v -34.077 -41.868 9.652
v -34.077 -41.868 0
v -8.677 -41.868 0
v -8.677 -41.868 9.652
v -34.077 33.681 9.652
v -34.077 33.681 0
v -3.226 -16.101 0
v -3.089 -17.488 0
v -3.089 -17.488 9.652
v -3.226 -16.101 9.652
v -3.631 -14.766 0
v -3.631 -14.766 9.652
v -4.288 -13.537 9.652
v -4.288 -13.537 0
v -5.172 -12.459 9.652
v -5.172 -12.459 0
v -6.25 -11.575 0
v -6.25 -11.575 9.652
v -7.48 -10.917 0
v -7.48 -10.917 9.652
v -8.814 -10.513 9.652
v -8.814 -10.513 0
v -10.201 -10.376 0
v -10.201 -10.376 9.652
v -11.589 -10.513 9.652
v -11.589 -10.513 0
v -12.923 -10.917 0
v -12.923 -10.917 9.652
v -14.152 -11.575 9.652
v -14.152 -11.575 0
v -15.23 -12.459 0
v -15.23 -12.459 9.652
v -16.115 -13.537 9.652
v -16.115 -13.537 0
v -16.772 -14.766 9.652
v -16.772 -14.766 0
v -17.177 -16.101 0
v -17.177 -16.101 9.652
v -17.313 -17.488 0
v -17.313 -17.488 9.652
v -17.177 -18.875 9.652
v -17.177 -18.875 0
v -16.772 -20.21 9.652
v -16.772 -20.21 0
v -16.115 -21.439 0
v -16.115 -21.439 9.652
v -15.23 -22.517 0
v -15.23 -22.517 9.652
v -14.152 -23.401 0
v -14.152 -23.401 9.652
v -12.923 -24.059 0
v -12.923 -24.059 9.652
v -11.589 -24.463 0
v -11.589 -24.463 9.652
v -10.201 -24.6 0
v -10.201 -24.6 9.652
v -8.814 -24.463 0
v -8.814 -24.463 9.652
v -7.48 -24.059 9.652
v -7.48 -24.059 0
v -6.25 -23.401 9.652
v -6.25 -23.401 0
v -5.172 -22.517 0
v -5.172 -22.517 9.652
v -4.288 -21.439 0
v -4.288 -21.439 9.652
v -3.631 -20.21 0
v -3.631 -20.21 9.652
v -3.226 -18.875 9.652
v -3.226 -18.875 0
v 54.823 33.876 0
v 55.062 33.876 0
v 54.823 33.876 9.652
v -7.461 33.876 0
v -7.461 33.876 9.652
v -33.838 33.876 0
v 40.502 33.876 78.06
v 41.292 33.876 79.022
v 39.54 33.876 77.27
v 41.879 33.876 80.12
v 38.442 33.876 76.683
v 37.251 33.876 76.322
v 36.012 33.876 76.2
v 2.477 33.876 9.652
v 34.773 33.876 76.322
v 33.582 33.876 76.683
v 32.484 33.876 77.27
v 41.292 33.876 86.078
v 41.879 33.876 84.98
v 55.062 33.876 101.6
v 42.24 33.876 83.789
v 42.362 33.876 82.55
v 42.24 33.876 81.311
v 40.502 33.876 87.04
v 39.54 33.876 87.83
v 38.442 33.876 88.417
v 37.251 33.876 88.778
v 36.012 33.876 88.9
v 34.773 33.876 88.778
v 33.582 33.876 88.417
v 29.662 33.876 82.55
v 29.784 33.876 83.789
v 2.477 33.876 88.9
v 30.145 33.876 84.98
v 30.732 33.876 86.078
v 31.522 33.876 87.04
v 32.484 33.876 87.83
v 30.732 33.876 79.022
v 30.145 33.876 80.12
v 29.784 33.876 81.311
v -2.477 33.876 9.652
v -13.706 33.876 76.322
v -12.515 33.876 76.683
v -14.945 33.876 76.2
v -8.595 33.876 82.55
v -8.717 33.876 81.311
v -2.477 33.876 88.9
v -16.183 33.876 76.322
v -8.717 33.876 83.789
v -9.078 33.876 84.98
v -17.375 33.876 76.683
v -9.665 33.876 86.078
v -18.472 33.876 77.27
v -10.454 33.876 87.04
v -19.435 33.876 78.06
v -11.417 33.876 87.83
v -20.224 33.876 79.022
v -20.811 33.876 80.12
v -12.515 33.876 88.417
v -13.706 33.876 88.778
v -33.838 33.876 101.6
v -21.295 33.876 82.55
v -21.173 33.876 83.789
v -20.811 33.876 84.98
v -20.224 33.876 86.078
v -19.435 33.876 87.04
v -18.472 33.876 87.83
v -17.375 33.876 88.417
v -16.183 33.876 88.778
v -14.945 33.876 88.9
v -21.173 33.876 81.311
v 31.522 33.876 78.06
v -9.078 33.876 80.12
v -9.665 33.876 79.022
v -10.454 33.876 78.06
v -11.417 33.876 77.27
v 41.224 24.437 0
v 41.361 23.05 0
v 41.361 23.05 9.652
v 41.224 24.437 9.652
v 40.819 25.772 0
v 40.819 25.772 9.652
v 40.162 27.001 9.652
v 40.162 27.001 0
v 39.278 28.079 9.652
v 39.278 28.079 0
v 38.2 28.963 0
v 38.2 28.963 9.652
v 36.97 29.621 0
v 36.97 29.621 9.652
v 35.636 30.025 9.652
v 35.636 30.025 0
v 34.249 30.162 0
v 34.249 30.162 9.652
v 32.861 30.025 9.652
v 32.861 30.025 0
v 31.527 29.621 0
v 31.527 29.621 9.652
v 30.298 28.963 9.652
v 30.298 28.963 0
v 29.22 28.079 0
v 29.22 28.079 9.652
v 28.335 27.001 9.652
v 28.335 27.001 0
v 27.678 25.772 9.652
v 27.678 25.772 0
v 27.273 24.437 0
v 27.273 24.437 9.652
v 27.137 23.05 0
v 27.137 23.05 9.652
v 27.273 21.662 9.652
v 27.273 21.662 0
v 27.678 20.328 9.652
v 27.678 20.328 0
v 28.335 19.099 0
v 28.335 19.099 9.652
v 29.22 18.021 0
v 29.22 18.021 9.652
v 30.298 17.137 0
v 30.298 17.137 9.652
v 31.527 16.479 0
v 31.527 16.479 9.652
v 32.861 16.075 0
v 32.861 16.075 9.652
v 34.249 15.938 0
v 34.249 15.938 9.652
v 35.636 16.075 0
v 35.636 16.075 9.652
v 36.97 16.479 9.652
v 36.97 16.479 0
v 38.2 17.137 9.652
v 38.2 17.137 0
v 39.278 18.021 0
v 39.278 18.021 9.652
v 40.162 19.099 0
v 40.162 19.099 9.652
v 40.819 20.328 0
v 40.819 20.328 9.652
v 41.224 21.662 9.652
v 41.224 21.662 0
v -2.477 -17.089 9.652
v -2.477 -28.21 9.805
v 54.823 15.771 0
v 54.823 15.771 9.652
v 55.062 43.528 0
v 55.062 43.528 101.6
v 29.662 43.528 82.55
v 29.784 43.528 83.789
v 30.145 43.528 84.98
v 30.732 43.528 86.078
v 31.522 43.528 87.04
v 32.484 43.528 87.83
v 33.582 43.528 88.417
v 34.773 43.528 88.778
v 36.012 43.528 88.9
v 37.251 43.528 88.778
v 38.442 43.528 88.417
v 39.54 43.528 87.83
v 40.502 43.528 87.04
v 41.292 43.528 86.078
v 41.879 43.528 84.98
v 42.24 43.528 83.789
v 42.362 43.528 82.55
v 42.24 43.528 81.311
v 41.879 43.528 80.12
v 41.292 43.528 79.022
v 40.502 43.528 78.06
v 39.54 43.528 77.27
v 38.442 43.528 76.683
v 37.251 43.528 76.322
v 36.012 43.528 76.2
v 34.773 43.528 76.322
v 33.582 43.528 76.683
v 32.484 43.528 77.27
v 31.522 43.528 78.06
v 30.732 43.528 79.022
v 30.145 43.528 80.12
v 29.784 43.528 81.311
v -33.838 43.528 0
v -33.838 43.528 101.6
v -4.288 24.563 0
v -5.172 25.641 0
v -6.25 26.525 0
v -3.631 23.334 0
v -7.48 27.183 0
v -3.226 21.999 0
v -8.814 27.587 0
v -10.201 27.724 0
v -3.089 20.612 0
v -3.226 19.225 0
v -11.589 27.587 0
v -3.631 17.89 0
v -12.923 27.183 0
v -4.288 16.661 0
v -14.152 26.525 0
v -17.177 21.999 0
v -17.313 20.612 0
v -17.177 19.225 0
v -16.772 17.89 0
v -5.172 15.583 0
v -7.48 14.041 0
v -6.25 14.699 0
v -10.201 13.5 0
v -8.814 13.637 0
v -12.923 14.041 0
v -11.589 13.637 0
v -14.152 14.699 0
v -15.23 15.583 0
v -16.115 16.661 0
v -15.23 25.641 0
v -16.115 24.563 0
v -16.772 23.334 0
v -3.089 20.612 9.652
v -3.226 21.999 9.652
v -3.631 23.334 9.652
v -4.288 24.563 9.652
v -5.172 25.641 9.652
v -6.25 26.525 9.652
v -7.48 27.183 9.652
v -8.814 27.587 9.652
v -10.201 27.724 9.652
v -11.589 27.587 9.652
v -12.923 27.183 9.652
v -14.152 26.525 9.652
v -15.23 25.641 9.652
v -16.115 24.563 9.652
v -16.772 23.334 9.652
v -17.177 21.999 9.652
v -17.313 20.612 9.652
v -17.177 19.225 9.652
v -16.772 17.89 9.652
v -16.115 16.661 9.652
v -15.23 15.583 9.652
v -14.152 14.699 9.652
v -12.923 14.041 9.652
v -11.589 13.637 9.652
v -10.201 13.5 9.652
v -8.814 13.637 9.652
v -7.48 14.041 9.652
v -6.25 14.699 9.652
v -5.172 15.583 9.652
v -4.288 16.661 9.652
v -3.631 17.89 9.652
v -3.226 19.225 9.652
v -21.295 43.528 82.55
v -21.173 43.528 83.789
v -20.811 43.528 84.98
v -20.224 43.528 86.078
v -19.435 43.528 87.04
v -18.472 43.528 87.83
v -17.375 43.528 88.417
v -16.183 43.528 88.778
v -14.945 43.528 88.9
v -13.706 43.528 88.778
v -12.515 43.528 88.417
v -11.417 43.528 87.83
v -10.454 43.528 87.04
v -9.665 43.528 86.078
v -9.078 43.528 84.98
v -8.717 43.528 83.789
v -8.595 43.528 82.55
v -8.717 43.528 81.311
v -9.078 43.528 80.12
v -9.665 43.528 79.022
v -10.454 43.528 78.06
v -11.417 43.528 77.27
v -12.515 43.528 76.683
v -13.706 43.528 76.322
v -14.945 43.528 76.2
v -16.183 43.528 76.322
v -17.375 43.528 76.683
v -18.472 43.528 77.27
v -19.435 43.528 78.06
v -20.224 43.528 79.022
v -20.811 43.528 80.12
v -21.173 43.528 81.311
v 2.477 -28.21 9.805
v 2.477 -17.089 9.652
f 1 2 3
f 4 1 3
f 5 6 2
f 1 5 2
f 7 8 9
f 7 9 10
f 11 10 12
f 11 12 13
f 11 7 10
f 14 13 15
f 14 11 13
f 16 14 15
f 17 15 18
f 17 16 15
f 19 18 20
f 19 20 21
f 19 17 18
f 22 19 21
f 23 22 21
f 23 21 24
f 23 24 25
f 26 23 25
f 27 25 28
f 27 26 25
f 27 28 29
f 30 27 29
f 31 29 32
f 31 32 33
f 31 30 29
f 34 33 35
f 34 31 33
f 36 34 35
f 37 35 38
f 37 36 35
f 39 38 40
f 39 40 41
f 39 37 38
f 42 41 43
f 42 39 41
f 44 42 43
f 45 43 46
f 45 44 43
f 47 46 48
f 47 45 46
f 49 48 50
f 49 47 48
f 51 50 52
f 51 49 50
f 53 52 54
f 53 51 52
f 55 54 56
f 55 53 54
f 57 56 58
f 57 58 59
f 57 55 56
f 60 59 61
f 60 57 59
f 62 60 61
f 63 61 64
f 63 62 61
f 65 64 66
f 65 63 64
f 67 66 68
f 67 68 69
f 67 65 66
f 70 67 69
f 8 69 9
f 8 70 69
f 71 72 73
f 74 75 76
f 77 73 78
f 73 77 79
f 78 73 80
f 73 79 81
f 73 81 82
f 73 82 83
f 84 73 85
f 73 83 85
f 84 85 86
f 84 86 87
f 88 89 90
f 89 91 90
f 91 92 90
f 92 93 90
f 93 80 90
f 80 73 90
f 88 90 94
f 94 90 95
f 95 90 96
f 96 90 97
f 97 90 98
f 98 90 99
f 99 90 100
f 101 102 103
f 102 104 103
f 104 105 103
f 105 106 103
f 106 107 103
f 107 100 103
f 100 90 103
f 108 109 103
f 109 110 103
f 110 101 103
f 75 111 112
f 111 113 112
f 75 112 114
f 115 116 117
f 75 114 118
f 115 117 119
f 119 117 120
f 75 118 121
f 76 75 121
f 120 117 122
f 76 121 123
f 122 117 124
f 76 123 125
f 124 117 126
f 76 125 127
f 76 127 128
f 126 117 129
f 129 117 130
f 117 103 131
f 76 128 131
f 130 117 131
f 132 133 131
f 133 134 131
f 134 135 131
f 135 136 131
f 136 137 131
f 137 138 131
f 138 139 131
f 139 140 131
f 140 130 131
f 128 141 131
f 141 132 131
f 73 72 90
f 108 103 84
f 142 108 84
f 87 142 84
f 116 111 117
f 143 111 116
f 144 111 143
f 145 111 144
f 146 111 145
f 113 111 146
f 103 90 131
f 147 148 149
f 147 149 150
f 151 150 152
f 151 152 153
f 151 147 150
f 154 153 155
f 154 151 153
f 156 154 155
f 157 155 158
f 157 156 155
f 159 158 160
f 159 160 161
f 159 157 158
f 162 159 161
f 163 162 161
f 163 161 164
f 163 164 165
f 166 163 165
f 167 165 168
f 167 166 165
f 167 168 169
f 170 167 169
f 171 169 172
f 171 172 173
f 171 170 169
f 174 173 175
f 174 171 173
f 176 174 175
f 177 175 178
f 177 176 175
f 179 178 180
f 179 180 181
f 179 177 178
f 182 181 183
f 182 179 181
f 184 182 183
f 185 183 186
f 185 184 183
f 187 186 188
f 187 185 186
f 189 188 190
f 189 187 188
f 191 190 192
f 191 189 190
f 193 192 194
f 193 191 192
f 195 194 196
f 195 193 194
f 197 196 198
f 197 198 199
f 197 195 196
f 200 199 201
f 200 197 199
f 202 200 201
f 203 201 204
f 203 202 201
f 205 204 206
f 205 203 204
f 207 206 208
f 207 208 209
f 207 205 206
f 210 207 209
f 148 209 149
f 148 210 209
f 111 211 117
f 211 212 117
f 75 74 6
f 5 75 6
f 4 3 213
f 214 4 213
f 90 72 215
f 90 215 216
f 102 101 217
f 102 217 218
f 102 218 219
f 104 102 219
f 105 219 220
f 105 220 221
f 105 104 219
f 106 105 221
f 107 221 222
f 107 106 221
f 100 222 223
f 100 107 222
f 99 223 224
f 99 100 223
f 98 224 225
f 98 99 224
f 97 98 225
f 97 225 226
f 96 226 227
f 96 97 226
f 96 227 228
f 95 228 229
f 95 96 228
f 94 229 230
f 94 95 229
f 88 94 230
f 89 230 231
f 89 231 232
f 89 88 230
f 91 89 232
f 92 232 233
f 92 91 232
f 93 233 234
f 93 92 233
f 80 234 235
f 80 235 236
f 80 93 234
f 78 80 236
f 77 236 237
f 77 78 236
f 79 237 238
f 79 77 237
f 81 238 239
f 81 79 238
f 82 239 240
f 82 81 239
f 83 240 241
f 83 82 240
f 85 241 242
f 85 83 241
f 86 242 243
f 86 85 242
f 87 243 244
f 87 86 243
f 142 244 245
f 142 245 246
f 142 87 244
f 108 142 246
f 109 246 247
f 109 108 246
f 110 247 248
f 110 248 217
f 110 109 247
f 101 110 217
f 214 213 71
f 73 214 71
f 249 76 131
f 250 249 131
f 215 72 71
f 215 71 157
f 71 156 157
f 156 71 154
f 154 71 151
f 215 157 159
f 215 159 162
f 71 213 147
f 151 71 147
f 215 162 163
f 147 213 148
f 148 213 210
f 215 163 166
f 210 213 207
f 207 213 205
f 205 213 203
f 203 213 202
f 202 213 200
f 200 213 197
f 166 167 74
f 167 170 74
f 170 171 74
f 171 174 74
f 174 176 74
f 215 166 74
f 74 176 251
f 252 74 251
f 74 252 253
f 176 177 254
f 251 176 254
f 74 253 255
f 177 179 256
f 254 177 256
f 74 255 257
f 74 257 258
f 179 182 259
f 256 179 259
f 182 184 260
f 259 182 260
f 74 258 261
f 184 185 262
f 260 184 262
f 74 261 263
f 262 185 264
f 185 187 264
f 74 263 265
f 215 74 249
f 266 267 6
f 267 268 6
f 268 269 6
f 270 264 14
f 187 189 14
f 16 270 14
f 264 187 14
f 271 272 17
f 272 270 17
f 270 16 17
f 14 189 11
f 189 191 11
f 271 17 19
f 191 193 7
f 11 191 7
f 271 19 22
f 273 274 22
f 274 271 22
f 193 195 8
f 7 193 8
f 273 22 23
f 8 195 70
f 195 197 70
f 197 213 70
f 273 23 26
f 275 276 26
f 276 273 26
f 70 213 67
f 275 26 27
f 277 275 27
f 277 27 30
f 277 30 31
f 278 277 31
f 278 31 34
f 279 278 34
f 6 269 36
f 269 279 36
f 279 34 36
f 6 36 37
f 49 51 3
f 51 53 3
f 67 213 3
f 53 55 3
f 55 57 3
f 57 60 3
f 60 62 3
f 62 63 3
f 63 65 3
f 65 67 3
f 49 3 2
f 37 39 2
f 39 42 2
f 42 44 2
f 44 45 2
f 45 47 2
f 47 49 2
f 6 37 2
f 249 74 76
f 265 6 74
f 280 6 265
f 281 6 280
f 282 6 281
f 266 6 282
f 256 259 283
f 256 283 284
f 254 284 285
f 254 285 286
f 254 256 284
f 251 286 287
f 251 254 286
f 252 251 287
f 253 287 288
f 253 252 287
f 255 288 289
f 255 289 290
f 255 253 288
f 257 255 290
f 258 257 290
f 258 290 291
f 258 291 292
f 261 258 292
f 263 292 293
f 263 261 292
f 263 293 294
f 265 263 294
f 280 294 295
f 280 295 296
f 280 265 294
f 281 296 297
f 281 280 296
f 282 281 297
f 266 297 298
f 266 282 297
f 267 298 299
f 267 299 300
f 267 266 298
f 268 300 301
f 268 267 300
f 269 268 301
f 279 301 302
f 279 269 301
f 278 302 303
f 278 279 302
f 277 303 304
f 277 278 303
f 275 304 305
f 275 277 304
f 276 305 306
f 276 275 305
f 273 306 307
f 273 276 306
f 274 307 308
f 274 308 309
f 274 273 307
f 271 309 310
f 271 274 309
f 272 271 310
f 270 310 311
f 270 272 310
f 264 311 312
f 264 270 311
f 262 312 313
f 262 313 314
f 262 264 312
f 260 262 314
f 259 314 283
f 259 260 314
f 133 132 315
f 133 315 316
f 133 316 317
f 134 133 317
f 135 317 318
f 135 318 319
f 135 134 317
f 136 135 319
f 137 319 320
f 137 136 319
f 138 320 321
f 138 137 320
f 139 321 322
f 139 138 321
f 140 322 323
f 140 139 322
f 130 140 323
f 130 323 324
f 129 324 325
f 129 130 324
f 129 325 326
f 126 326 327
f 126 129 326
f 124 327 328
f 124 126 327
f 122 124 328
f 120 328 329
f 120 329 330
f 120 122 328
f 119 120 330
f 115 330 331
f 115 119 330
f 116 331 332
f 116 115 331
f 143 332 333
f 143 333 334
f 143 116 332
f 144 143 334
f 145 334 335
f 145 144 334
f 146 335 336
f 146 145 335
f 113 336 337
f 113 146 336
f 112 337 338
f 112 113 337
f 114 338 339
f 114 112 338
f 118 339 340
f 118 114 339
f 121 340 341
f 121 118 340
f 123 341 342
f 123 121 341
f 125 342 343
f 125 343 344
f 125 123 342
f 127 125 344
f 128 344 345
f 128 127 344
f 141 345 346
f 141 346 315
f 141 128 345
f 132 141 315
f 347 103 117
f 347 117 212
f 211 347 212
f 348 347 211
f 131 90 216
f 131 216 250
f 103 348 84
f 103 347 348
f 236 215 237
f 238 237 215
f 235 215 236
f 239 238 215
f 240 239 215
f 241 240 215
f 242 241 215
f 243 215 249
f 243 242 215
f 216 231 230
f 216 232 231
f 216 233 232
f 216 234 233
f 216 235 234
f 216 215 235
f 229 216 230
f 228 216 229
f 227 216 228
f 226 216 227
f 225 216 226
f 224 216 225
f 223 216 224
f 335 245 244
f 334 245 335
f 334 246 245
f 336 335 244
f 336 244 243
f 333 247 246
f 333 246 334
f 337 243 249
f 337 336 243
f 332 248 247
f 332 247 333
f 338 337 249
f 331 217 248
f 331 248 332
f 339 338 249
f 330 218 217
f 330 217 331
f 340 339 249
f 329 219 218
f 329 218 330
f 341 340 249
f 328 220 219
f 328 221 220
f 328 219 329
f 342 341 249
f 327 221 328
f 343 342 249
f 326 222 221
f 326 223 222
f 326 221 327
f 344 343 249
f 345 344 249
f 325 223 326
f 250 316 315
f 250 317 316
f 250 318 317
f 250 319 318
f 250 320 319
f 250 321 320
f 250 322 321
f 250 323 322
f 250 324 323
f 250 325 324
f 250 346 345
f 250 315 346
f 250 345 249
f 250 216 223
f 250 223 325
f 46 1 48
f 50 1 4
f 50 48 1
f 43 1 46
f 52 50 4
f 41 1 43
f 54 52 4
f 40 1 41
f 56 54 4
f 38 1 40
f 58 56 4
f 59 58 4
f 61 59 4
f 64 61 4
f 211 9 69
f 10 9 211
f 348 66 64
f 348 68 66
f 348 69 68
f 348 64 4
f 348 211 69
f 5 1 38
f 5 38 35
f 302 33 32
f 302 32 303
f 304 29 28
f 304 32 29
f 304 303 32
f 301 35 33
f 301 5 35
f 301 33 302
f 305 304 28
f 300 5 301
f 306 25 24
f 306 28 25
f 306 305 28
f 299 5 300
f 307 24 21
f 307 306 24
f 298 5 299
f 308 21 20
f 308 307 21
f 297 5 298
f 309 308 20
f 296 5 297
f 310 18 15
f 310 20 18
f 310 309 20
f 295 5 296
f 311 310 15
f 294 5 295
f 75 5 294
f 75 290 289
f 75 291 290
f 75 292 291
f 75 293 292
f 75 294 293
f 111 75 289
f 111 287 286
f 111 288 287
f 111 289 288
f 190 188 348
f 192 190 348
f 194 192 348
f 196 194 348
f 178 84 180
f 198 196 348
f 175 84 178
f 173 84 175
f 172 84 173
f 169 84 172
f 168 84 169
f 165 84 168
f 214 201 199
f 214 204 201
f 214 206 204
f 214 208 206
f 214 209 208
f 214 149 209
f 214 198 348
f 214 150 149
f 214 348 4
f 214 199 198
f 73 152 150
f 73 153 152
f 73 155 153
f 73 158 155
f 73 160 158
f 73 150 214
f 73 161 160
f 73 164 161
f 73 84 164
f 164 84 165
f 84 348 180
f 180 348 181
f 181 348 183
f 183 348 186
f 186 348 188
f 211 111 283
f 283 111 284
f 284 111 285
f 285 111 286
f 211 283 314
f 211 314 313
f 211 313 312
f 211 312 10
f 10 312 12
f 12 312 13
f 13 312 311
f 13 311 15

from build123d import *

# Parameters (mm, degrees)
F0_R     = 7.112
F1_DEPTH = 9.652
F3_DEPTH = 2.47735
F4_W     = 88.9
F4_H     = 101.6
F4_R     = 6.35
F5_DEPTH = 9.652


with BuildPart() as f1:
    # F0 (on Top) → F1 (new body)
    with BuildSketch(Plane.XY):
        Polygon((54.822839, 34.332216), (-34.077161, 33.680932), (-34.077161, -41.867784), (-8.677161, -41.867784), (54.822839, 15.770677), align=None)
        with Locations((-10.201161, -17.488004)):
            Circle(F0_R, mode=Mode.SUBTRACT)
        with Locations((-10.201161, 20.611996)):
            Circle(F0_R, mode=Mode.SUBTRACT)
        with Locations((34.248839, 23.049973)):
            Circle(F0_R, mode=Mode.SUBTRACT)
    extrude(amount=F1_DEPTH)

    # F2 (on Right) → F3 (join, symmetric)
    with BuildSketch(Plane.YZ):
        Polygon((33.87592, 8.95272), (33.87592, 88.9), (-28.20982, 9.804583), align=None)
    extrude(amount=F3_DEPTH, both=True)

    # F4 (on face) → F5 (join)
    with BuildSketch(Plane(origin=(0, 33.87592, 0), x_dir=(-1, 0, 0), z_dir=(0, 1, 0))):
        with Locations((-10.612122, 50.8)):
            Rectangle(F4_W, F4_H)
        with Locations((-36.012122, 82.55)):
            Circle(F4_R, mode=Mode.SUBTRACT)
        with Locations((14.944623, 82.55)):
            Circle(F4_R, mode=Mode.SUBTRACT)
    extrude(amount=F5_DEPTH)


solid = f1.part
